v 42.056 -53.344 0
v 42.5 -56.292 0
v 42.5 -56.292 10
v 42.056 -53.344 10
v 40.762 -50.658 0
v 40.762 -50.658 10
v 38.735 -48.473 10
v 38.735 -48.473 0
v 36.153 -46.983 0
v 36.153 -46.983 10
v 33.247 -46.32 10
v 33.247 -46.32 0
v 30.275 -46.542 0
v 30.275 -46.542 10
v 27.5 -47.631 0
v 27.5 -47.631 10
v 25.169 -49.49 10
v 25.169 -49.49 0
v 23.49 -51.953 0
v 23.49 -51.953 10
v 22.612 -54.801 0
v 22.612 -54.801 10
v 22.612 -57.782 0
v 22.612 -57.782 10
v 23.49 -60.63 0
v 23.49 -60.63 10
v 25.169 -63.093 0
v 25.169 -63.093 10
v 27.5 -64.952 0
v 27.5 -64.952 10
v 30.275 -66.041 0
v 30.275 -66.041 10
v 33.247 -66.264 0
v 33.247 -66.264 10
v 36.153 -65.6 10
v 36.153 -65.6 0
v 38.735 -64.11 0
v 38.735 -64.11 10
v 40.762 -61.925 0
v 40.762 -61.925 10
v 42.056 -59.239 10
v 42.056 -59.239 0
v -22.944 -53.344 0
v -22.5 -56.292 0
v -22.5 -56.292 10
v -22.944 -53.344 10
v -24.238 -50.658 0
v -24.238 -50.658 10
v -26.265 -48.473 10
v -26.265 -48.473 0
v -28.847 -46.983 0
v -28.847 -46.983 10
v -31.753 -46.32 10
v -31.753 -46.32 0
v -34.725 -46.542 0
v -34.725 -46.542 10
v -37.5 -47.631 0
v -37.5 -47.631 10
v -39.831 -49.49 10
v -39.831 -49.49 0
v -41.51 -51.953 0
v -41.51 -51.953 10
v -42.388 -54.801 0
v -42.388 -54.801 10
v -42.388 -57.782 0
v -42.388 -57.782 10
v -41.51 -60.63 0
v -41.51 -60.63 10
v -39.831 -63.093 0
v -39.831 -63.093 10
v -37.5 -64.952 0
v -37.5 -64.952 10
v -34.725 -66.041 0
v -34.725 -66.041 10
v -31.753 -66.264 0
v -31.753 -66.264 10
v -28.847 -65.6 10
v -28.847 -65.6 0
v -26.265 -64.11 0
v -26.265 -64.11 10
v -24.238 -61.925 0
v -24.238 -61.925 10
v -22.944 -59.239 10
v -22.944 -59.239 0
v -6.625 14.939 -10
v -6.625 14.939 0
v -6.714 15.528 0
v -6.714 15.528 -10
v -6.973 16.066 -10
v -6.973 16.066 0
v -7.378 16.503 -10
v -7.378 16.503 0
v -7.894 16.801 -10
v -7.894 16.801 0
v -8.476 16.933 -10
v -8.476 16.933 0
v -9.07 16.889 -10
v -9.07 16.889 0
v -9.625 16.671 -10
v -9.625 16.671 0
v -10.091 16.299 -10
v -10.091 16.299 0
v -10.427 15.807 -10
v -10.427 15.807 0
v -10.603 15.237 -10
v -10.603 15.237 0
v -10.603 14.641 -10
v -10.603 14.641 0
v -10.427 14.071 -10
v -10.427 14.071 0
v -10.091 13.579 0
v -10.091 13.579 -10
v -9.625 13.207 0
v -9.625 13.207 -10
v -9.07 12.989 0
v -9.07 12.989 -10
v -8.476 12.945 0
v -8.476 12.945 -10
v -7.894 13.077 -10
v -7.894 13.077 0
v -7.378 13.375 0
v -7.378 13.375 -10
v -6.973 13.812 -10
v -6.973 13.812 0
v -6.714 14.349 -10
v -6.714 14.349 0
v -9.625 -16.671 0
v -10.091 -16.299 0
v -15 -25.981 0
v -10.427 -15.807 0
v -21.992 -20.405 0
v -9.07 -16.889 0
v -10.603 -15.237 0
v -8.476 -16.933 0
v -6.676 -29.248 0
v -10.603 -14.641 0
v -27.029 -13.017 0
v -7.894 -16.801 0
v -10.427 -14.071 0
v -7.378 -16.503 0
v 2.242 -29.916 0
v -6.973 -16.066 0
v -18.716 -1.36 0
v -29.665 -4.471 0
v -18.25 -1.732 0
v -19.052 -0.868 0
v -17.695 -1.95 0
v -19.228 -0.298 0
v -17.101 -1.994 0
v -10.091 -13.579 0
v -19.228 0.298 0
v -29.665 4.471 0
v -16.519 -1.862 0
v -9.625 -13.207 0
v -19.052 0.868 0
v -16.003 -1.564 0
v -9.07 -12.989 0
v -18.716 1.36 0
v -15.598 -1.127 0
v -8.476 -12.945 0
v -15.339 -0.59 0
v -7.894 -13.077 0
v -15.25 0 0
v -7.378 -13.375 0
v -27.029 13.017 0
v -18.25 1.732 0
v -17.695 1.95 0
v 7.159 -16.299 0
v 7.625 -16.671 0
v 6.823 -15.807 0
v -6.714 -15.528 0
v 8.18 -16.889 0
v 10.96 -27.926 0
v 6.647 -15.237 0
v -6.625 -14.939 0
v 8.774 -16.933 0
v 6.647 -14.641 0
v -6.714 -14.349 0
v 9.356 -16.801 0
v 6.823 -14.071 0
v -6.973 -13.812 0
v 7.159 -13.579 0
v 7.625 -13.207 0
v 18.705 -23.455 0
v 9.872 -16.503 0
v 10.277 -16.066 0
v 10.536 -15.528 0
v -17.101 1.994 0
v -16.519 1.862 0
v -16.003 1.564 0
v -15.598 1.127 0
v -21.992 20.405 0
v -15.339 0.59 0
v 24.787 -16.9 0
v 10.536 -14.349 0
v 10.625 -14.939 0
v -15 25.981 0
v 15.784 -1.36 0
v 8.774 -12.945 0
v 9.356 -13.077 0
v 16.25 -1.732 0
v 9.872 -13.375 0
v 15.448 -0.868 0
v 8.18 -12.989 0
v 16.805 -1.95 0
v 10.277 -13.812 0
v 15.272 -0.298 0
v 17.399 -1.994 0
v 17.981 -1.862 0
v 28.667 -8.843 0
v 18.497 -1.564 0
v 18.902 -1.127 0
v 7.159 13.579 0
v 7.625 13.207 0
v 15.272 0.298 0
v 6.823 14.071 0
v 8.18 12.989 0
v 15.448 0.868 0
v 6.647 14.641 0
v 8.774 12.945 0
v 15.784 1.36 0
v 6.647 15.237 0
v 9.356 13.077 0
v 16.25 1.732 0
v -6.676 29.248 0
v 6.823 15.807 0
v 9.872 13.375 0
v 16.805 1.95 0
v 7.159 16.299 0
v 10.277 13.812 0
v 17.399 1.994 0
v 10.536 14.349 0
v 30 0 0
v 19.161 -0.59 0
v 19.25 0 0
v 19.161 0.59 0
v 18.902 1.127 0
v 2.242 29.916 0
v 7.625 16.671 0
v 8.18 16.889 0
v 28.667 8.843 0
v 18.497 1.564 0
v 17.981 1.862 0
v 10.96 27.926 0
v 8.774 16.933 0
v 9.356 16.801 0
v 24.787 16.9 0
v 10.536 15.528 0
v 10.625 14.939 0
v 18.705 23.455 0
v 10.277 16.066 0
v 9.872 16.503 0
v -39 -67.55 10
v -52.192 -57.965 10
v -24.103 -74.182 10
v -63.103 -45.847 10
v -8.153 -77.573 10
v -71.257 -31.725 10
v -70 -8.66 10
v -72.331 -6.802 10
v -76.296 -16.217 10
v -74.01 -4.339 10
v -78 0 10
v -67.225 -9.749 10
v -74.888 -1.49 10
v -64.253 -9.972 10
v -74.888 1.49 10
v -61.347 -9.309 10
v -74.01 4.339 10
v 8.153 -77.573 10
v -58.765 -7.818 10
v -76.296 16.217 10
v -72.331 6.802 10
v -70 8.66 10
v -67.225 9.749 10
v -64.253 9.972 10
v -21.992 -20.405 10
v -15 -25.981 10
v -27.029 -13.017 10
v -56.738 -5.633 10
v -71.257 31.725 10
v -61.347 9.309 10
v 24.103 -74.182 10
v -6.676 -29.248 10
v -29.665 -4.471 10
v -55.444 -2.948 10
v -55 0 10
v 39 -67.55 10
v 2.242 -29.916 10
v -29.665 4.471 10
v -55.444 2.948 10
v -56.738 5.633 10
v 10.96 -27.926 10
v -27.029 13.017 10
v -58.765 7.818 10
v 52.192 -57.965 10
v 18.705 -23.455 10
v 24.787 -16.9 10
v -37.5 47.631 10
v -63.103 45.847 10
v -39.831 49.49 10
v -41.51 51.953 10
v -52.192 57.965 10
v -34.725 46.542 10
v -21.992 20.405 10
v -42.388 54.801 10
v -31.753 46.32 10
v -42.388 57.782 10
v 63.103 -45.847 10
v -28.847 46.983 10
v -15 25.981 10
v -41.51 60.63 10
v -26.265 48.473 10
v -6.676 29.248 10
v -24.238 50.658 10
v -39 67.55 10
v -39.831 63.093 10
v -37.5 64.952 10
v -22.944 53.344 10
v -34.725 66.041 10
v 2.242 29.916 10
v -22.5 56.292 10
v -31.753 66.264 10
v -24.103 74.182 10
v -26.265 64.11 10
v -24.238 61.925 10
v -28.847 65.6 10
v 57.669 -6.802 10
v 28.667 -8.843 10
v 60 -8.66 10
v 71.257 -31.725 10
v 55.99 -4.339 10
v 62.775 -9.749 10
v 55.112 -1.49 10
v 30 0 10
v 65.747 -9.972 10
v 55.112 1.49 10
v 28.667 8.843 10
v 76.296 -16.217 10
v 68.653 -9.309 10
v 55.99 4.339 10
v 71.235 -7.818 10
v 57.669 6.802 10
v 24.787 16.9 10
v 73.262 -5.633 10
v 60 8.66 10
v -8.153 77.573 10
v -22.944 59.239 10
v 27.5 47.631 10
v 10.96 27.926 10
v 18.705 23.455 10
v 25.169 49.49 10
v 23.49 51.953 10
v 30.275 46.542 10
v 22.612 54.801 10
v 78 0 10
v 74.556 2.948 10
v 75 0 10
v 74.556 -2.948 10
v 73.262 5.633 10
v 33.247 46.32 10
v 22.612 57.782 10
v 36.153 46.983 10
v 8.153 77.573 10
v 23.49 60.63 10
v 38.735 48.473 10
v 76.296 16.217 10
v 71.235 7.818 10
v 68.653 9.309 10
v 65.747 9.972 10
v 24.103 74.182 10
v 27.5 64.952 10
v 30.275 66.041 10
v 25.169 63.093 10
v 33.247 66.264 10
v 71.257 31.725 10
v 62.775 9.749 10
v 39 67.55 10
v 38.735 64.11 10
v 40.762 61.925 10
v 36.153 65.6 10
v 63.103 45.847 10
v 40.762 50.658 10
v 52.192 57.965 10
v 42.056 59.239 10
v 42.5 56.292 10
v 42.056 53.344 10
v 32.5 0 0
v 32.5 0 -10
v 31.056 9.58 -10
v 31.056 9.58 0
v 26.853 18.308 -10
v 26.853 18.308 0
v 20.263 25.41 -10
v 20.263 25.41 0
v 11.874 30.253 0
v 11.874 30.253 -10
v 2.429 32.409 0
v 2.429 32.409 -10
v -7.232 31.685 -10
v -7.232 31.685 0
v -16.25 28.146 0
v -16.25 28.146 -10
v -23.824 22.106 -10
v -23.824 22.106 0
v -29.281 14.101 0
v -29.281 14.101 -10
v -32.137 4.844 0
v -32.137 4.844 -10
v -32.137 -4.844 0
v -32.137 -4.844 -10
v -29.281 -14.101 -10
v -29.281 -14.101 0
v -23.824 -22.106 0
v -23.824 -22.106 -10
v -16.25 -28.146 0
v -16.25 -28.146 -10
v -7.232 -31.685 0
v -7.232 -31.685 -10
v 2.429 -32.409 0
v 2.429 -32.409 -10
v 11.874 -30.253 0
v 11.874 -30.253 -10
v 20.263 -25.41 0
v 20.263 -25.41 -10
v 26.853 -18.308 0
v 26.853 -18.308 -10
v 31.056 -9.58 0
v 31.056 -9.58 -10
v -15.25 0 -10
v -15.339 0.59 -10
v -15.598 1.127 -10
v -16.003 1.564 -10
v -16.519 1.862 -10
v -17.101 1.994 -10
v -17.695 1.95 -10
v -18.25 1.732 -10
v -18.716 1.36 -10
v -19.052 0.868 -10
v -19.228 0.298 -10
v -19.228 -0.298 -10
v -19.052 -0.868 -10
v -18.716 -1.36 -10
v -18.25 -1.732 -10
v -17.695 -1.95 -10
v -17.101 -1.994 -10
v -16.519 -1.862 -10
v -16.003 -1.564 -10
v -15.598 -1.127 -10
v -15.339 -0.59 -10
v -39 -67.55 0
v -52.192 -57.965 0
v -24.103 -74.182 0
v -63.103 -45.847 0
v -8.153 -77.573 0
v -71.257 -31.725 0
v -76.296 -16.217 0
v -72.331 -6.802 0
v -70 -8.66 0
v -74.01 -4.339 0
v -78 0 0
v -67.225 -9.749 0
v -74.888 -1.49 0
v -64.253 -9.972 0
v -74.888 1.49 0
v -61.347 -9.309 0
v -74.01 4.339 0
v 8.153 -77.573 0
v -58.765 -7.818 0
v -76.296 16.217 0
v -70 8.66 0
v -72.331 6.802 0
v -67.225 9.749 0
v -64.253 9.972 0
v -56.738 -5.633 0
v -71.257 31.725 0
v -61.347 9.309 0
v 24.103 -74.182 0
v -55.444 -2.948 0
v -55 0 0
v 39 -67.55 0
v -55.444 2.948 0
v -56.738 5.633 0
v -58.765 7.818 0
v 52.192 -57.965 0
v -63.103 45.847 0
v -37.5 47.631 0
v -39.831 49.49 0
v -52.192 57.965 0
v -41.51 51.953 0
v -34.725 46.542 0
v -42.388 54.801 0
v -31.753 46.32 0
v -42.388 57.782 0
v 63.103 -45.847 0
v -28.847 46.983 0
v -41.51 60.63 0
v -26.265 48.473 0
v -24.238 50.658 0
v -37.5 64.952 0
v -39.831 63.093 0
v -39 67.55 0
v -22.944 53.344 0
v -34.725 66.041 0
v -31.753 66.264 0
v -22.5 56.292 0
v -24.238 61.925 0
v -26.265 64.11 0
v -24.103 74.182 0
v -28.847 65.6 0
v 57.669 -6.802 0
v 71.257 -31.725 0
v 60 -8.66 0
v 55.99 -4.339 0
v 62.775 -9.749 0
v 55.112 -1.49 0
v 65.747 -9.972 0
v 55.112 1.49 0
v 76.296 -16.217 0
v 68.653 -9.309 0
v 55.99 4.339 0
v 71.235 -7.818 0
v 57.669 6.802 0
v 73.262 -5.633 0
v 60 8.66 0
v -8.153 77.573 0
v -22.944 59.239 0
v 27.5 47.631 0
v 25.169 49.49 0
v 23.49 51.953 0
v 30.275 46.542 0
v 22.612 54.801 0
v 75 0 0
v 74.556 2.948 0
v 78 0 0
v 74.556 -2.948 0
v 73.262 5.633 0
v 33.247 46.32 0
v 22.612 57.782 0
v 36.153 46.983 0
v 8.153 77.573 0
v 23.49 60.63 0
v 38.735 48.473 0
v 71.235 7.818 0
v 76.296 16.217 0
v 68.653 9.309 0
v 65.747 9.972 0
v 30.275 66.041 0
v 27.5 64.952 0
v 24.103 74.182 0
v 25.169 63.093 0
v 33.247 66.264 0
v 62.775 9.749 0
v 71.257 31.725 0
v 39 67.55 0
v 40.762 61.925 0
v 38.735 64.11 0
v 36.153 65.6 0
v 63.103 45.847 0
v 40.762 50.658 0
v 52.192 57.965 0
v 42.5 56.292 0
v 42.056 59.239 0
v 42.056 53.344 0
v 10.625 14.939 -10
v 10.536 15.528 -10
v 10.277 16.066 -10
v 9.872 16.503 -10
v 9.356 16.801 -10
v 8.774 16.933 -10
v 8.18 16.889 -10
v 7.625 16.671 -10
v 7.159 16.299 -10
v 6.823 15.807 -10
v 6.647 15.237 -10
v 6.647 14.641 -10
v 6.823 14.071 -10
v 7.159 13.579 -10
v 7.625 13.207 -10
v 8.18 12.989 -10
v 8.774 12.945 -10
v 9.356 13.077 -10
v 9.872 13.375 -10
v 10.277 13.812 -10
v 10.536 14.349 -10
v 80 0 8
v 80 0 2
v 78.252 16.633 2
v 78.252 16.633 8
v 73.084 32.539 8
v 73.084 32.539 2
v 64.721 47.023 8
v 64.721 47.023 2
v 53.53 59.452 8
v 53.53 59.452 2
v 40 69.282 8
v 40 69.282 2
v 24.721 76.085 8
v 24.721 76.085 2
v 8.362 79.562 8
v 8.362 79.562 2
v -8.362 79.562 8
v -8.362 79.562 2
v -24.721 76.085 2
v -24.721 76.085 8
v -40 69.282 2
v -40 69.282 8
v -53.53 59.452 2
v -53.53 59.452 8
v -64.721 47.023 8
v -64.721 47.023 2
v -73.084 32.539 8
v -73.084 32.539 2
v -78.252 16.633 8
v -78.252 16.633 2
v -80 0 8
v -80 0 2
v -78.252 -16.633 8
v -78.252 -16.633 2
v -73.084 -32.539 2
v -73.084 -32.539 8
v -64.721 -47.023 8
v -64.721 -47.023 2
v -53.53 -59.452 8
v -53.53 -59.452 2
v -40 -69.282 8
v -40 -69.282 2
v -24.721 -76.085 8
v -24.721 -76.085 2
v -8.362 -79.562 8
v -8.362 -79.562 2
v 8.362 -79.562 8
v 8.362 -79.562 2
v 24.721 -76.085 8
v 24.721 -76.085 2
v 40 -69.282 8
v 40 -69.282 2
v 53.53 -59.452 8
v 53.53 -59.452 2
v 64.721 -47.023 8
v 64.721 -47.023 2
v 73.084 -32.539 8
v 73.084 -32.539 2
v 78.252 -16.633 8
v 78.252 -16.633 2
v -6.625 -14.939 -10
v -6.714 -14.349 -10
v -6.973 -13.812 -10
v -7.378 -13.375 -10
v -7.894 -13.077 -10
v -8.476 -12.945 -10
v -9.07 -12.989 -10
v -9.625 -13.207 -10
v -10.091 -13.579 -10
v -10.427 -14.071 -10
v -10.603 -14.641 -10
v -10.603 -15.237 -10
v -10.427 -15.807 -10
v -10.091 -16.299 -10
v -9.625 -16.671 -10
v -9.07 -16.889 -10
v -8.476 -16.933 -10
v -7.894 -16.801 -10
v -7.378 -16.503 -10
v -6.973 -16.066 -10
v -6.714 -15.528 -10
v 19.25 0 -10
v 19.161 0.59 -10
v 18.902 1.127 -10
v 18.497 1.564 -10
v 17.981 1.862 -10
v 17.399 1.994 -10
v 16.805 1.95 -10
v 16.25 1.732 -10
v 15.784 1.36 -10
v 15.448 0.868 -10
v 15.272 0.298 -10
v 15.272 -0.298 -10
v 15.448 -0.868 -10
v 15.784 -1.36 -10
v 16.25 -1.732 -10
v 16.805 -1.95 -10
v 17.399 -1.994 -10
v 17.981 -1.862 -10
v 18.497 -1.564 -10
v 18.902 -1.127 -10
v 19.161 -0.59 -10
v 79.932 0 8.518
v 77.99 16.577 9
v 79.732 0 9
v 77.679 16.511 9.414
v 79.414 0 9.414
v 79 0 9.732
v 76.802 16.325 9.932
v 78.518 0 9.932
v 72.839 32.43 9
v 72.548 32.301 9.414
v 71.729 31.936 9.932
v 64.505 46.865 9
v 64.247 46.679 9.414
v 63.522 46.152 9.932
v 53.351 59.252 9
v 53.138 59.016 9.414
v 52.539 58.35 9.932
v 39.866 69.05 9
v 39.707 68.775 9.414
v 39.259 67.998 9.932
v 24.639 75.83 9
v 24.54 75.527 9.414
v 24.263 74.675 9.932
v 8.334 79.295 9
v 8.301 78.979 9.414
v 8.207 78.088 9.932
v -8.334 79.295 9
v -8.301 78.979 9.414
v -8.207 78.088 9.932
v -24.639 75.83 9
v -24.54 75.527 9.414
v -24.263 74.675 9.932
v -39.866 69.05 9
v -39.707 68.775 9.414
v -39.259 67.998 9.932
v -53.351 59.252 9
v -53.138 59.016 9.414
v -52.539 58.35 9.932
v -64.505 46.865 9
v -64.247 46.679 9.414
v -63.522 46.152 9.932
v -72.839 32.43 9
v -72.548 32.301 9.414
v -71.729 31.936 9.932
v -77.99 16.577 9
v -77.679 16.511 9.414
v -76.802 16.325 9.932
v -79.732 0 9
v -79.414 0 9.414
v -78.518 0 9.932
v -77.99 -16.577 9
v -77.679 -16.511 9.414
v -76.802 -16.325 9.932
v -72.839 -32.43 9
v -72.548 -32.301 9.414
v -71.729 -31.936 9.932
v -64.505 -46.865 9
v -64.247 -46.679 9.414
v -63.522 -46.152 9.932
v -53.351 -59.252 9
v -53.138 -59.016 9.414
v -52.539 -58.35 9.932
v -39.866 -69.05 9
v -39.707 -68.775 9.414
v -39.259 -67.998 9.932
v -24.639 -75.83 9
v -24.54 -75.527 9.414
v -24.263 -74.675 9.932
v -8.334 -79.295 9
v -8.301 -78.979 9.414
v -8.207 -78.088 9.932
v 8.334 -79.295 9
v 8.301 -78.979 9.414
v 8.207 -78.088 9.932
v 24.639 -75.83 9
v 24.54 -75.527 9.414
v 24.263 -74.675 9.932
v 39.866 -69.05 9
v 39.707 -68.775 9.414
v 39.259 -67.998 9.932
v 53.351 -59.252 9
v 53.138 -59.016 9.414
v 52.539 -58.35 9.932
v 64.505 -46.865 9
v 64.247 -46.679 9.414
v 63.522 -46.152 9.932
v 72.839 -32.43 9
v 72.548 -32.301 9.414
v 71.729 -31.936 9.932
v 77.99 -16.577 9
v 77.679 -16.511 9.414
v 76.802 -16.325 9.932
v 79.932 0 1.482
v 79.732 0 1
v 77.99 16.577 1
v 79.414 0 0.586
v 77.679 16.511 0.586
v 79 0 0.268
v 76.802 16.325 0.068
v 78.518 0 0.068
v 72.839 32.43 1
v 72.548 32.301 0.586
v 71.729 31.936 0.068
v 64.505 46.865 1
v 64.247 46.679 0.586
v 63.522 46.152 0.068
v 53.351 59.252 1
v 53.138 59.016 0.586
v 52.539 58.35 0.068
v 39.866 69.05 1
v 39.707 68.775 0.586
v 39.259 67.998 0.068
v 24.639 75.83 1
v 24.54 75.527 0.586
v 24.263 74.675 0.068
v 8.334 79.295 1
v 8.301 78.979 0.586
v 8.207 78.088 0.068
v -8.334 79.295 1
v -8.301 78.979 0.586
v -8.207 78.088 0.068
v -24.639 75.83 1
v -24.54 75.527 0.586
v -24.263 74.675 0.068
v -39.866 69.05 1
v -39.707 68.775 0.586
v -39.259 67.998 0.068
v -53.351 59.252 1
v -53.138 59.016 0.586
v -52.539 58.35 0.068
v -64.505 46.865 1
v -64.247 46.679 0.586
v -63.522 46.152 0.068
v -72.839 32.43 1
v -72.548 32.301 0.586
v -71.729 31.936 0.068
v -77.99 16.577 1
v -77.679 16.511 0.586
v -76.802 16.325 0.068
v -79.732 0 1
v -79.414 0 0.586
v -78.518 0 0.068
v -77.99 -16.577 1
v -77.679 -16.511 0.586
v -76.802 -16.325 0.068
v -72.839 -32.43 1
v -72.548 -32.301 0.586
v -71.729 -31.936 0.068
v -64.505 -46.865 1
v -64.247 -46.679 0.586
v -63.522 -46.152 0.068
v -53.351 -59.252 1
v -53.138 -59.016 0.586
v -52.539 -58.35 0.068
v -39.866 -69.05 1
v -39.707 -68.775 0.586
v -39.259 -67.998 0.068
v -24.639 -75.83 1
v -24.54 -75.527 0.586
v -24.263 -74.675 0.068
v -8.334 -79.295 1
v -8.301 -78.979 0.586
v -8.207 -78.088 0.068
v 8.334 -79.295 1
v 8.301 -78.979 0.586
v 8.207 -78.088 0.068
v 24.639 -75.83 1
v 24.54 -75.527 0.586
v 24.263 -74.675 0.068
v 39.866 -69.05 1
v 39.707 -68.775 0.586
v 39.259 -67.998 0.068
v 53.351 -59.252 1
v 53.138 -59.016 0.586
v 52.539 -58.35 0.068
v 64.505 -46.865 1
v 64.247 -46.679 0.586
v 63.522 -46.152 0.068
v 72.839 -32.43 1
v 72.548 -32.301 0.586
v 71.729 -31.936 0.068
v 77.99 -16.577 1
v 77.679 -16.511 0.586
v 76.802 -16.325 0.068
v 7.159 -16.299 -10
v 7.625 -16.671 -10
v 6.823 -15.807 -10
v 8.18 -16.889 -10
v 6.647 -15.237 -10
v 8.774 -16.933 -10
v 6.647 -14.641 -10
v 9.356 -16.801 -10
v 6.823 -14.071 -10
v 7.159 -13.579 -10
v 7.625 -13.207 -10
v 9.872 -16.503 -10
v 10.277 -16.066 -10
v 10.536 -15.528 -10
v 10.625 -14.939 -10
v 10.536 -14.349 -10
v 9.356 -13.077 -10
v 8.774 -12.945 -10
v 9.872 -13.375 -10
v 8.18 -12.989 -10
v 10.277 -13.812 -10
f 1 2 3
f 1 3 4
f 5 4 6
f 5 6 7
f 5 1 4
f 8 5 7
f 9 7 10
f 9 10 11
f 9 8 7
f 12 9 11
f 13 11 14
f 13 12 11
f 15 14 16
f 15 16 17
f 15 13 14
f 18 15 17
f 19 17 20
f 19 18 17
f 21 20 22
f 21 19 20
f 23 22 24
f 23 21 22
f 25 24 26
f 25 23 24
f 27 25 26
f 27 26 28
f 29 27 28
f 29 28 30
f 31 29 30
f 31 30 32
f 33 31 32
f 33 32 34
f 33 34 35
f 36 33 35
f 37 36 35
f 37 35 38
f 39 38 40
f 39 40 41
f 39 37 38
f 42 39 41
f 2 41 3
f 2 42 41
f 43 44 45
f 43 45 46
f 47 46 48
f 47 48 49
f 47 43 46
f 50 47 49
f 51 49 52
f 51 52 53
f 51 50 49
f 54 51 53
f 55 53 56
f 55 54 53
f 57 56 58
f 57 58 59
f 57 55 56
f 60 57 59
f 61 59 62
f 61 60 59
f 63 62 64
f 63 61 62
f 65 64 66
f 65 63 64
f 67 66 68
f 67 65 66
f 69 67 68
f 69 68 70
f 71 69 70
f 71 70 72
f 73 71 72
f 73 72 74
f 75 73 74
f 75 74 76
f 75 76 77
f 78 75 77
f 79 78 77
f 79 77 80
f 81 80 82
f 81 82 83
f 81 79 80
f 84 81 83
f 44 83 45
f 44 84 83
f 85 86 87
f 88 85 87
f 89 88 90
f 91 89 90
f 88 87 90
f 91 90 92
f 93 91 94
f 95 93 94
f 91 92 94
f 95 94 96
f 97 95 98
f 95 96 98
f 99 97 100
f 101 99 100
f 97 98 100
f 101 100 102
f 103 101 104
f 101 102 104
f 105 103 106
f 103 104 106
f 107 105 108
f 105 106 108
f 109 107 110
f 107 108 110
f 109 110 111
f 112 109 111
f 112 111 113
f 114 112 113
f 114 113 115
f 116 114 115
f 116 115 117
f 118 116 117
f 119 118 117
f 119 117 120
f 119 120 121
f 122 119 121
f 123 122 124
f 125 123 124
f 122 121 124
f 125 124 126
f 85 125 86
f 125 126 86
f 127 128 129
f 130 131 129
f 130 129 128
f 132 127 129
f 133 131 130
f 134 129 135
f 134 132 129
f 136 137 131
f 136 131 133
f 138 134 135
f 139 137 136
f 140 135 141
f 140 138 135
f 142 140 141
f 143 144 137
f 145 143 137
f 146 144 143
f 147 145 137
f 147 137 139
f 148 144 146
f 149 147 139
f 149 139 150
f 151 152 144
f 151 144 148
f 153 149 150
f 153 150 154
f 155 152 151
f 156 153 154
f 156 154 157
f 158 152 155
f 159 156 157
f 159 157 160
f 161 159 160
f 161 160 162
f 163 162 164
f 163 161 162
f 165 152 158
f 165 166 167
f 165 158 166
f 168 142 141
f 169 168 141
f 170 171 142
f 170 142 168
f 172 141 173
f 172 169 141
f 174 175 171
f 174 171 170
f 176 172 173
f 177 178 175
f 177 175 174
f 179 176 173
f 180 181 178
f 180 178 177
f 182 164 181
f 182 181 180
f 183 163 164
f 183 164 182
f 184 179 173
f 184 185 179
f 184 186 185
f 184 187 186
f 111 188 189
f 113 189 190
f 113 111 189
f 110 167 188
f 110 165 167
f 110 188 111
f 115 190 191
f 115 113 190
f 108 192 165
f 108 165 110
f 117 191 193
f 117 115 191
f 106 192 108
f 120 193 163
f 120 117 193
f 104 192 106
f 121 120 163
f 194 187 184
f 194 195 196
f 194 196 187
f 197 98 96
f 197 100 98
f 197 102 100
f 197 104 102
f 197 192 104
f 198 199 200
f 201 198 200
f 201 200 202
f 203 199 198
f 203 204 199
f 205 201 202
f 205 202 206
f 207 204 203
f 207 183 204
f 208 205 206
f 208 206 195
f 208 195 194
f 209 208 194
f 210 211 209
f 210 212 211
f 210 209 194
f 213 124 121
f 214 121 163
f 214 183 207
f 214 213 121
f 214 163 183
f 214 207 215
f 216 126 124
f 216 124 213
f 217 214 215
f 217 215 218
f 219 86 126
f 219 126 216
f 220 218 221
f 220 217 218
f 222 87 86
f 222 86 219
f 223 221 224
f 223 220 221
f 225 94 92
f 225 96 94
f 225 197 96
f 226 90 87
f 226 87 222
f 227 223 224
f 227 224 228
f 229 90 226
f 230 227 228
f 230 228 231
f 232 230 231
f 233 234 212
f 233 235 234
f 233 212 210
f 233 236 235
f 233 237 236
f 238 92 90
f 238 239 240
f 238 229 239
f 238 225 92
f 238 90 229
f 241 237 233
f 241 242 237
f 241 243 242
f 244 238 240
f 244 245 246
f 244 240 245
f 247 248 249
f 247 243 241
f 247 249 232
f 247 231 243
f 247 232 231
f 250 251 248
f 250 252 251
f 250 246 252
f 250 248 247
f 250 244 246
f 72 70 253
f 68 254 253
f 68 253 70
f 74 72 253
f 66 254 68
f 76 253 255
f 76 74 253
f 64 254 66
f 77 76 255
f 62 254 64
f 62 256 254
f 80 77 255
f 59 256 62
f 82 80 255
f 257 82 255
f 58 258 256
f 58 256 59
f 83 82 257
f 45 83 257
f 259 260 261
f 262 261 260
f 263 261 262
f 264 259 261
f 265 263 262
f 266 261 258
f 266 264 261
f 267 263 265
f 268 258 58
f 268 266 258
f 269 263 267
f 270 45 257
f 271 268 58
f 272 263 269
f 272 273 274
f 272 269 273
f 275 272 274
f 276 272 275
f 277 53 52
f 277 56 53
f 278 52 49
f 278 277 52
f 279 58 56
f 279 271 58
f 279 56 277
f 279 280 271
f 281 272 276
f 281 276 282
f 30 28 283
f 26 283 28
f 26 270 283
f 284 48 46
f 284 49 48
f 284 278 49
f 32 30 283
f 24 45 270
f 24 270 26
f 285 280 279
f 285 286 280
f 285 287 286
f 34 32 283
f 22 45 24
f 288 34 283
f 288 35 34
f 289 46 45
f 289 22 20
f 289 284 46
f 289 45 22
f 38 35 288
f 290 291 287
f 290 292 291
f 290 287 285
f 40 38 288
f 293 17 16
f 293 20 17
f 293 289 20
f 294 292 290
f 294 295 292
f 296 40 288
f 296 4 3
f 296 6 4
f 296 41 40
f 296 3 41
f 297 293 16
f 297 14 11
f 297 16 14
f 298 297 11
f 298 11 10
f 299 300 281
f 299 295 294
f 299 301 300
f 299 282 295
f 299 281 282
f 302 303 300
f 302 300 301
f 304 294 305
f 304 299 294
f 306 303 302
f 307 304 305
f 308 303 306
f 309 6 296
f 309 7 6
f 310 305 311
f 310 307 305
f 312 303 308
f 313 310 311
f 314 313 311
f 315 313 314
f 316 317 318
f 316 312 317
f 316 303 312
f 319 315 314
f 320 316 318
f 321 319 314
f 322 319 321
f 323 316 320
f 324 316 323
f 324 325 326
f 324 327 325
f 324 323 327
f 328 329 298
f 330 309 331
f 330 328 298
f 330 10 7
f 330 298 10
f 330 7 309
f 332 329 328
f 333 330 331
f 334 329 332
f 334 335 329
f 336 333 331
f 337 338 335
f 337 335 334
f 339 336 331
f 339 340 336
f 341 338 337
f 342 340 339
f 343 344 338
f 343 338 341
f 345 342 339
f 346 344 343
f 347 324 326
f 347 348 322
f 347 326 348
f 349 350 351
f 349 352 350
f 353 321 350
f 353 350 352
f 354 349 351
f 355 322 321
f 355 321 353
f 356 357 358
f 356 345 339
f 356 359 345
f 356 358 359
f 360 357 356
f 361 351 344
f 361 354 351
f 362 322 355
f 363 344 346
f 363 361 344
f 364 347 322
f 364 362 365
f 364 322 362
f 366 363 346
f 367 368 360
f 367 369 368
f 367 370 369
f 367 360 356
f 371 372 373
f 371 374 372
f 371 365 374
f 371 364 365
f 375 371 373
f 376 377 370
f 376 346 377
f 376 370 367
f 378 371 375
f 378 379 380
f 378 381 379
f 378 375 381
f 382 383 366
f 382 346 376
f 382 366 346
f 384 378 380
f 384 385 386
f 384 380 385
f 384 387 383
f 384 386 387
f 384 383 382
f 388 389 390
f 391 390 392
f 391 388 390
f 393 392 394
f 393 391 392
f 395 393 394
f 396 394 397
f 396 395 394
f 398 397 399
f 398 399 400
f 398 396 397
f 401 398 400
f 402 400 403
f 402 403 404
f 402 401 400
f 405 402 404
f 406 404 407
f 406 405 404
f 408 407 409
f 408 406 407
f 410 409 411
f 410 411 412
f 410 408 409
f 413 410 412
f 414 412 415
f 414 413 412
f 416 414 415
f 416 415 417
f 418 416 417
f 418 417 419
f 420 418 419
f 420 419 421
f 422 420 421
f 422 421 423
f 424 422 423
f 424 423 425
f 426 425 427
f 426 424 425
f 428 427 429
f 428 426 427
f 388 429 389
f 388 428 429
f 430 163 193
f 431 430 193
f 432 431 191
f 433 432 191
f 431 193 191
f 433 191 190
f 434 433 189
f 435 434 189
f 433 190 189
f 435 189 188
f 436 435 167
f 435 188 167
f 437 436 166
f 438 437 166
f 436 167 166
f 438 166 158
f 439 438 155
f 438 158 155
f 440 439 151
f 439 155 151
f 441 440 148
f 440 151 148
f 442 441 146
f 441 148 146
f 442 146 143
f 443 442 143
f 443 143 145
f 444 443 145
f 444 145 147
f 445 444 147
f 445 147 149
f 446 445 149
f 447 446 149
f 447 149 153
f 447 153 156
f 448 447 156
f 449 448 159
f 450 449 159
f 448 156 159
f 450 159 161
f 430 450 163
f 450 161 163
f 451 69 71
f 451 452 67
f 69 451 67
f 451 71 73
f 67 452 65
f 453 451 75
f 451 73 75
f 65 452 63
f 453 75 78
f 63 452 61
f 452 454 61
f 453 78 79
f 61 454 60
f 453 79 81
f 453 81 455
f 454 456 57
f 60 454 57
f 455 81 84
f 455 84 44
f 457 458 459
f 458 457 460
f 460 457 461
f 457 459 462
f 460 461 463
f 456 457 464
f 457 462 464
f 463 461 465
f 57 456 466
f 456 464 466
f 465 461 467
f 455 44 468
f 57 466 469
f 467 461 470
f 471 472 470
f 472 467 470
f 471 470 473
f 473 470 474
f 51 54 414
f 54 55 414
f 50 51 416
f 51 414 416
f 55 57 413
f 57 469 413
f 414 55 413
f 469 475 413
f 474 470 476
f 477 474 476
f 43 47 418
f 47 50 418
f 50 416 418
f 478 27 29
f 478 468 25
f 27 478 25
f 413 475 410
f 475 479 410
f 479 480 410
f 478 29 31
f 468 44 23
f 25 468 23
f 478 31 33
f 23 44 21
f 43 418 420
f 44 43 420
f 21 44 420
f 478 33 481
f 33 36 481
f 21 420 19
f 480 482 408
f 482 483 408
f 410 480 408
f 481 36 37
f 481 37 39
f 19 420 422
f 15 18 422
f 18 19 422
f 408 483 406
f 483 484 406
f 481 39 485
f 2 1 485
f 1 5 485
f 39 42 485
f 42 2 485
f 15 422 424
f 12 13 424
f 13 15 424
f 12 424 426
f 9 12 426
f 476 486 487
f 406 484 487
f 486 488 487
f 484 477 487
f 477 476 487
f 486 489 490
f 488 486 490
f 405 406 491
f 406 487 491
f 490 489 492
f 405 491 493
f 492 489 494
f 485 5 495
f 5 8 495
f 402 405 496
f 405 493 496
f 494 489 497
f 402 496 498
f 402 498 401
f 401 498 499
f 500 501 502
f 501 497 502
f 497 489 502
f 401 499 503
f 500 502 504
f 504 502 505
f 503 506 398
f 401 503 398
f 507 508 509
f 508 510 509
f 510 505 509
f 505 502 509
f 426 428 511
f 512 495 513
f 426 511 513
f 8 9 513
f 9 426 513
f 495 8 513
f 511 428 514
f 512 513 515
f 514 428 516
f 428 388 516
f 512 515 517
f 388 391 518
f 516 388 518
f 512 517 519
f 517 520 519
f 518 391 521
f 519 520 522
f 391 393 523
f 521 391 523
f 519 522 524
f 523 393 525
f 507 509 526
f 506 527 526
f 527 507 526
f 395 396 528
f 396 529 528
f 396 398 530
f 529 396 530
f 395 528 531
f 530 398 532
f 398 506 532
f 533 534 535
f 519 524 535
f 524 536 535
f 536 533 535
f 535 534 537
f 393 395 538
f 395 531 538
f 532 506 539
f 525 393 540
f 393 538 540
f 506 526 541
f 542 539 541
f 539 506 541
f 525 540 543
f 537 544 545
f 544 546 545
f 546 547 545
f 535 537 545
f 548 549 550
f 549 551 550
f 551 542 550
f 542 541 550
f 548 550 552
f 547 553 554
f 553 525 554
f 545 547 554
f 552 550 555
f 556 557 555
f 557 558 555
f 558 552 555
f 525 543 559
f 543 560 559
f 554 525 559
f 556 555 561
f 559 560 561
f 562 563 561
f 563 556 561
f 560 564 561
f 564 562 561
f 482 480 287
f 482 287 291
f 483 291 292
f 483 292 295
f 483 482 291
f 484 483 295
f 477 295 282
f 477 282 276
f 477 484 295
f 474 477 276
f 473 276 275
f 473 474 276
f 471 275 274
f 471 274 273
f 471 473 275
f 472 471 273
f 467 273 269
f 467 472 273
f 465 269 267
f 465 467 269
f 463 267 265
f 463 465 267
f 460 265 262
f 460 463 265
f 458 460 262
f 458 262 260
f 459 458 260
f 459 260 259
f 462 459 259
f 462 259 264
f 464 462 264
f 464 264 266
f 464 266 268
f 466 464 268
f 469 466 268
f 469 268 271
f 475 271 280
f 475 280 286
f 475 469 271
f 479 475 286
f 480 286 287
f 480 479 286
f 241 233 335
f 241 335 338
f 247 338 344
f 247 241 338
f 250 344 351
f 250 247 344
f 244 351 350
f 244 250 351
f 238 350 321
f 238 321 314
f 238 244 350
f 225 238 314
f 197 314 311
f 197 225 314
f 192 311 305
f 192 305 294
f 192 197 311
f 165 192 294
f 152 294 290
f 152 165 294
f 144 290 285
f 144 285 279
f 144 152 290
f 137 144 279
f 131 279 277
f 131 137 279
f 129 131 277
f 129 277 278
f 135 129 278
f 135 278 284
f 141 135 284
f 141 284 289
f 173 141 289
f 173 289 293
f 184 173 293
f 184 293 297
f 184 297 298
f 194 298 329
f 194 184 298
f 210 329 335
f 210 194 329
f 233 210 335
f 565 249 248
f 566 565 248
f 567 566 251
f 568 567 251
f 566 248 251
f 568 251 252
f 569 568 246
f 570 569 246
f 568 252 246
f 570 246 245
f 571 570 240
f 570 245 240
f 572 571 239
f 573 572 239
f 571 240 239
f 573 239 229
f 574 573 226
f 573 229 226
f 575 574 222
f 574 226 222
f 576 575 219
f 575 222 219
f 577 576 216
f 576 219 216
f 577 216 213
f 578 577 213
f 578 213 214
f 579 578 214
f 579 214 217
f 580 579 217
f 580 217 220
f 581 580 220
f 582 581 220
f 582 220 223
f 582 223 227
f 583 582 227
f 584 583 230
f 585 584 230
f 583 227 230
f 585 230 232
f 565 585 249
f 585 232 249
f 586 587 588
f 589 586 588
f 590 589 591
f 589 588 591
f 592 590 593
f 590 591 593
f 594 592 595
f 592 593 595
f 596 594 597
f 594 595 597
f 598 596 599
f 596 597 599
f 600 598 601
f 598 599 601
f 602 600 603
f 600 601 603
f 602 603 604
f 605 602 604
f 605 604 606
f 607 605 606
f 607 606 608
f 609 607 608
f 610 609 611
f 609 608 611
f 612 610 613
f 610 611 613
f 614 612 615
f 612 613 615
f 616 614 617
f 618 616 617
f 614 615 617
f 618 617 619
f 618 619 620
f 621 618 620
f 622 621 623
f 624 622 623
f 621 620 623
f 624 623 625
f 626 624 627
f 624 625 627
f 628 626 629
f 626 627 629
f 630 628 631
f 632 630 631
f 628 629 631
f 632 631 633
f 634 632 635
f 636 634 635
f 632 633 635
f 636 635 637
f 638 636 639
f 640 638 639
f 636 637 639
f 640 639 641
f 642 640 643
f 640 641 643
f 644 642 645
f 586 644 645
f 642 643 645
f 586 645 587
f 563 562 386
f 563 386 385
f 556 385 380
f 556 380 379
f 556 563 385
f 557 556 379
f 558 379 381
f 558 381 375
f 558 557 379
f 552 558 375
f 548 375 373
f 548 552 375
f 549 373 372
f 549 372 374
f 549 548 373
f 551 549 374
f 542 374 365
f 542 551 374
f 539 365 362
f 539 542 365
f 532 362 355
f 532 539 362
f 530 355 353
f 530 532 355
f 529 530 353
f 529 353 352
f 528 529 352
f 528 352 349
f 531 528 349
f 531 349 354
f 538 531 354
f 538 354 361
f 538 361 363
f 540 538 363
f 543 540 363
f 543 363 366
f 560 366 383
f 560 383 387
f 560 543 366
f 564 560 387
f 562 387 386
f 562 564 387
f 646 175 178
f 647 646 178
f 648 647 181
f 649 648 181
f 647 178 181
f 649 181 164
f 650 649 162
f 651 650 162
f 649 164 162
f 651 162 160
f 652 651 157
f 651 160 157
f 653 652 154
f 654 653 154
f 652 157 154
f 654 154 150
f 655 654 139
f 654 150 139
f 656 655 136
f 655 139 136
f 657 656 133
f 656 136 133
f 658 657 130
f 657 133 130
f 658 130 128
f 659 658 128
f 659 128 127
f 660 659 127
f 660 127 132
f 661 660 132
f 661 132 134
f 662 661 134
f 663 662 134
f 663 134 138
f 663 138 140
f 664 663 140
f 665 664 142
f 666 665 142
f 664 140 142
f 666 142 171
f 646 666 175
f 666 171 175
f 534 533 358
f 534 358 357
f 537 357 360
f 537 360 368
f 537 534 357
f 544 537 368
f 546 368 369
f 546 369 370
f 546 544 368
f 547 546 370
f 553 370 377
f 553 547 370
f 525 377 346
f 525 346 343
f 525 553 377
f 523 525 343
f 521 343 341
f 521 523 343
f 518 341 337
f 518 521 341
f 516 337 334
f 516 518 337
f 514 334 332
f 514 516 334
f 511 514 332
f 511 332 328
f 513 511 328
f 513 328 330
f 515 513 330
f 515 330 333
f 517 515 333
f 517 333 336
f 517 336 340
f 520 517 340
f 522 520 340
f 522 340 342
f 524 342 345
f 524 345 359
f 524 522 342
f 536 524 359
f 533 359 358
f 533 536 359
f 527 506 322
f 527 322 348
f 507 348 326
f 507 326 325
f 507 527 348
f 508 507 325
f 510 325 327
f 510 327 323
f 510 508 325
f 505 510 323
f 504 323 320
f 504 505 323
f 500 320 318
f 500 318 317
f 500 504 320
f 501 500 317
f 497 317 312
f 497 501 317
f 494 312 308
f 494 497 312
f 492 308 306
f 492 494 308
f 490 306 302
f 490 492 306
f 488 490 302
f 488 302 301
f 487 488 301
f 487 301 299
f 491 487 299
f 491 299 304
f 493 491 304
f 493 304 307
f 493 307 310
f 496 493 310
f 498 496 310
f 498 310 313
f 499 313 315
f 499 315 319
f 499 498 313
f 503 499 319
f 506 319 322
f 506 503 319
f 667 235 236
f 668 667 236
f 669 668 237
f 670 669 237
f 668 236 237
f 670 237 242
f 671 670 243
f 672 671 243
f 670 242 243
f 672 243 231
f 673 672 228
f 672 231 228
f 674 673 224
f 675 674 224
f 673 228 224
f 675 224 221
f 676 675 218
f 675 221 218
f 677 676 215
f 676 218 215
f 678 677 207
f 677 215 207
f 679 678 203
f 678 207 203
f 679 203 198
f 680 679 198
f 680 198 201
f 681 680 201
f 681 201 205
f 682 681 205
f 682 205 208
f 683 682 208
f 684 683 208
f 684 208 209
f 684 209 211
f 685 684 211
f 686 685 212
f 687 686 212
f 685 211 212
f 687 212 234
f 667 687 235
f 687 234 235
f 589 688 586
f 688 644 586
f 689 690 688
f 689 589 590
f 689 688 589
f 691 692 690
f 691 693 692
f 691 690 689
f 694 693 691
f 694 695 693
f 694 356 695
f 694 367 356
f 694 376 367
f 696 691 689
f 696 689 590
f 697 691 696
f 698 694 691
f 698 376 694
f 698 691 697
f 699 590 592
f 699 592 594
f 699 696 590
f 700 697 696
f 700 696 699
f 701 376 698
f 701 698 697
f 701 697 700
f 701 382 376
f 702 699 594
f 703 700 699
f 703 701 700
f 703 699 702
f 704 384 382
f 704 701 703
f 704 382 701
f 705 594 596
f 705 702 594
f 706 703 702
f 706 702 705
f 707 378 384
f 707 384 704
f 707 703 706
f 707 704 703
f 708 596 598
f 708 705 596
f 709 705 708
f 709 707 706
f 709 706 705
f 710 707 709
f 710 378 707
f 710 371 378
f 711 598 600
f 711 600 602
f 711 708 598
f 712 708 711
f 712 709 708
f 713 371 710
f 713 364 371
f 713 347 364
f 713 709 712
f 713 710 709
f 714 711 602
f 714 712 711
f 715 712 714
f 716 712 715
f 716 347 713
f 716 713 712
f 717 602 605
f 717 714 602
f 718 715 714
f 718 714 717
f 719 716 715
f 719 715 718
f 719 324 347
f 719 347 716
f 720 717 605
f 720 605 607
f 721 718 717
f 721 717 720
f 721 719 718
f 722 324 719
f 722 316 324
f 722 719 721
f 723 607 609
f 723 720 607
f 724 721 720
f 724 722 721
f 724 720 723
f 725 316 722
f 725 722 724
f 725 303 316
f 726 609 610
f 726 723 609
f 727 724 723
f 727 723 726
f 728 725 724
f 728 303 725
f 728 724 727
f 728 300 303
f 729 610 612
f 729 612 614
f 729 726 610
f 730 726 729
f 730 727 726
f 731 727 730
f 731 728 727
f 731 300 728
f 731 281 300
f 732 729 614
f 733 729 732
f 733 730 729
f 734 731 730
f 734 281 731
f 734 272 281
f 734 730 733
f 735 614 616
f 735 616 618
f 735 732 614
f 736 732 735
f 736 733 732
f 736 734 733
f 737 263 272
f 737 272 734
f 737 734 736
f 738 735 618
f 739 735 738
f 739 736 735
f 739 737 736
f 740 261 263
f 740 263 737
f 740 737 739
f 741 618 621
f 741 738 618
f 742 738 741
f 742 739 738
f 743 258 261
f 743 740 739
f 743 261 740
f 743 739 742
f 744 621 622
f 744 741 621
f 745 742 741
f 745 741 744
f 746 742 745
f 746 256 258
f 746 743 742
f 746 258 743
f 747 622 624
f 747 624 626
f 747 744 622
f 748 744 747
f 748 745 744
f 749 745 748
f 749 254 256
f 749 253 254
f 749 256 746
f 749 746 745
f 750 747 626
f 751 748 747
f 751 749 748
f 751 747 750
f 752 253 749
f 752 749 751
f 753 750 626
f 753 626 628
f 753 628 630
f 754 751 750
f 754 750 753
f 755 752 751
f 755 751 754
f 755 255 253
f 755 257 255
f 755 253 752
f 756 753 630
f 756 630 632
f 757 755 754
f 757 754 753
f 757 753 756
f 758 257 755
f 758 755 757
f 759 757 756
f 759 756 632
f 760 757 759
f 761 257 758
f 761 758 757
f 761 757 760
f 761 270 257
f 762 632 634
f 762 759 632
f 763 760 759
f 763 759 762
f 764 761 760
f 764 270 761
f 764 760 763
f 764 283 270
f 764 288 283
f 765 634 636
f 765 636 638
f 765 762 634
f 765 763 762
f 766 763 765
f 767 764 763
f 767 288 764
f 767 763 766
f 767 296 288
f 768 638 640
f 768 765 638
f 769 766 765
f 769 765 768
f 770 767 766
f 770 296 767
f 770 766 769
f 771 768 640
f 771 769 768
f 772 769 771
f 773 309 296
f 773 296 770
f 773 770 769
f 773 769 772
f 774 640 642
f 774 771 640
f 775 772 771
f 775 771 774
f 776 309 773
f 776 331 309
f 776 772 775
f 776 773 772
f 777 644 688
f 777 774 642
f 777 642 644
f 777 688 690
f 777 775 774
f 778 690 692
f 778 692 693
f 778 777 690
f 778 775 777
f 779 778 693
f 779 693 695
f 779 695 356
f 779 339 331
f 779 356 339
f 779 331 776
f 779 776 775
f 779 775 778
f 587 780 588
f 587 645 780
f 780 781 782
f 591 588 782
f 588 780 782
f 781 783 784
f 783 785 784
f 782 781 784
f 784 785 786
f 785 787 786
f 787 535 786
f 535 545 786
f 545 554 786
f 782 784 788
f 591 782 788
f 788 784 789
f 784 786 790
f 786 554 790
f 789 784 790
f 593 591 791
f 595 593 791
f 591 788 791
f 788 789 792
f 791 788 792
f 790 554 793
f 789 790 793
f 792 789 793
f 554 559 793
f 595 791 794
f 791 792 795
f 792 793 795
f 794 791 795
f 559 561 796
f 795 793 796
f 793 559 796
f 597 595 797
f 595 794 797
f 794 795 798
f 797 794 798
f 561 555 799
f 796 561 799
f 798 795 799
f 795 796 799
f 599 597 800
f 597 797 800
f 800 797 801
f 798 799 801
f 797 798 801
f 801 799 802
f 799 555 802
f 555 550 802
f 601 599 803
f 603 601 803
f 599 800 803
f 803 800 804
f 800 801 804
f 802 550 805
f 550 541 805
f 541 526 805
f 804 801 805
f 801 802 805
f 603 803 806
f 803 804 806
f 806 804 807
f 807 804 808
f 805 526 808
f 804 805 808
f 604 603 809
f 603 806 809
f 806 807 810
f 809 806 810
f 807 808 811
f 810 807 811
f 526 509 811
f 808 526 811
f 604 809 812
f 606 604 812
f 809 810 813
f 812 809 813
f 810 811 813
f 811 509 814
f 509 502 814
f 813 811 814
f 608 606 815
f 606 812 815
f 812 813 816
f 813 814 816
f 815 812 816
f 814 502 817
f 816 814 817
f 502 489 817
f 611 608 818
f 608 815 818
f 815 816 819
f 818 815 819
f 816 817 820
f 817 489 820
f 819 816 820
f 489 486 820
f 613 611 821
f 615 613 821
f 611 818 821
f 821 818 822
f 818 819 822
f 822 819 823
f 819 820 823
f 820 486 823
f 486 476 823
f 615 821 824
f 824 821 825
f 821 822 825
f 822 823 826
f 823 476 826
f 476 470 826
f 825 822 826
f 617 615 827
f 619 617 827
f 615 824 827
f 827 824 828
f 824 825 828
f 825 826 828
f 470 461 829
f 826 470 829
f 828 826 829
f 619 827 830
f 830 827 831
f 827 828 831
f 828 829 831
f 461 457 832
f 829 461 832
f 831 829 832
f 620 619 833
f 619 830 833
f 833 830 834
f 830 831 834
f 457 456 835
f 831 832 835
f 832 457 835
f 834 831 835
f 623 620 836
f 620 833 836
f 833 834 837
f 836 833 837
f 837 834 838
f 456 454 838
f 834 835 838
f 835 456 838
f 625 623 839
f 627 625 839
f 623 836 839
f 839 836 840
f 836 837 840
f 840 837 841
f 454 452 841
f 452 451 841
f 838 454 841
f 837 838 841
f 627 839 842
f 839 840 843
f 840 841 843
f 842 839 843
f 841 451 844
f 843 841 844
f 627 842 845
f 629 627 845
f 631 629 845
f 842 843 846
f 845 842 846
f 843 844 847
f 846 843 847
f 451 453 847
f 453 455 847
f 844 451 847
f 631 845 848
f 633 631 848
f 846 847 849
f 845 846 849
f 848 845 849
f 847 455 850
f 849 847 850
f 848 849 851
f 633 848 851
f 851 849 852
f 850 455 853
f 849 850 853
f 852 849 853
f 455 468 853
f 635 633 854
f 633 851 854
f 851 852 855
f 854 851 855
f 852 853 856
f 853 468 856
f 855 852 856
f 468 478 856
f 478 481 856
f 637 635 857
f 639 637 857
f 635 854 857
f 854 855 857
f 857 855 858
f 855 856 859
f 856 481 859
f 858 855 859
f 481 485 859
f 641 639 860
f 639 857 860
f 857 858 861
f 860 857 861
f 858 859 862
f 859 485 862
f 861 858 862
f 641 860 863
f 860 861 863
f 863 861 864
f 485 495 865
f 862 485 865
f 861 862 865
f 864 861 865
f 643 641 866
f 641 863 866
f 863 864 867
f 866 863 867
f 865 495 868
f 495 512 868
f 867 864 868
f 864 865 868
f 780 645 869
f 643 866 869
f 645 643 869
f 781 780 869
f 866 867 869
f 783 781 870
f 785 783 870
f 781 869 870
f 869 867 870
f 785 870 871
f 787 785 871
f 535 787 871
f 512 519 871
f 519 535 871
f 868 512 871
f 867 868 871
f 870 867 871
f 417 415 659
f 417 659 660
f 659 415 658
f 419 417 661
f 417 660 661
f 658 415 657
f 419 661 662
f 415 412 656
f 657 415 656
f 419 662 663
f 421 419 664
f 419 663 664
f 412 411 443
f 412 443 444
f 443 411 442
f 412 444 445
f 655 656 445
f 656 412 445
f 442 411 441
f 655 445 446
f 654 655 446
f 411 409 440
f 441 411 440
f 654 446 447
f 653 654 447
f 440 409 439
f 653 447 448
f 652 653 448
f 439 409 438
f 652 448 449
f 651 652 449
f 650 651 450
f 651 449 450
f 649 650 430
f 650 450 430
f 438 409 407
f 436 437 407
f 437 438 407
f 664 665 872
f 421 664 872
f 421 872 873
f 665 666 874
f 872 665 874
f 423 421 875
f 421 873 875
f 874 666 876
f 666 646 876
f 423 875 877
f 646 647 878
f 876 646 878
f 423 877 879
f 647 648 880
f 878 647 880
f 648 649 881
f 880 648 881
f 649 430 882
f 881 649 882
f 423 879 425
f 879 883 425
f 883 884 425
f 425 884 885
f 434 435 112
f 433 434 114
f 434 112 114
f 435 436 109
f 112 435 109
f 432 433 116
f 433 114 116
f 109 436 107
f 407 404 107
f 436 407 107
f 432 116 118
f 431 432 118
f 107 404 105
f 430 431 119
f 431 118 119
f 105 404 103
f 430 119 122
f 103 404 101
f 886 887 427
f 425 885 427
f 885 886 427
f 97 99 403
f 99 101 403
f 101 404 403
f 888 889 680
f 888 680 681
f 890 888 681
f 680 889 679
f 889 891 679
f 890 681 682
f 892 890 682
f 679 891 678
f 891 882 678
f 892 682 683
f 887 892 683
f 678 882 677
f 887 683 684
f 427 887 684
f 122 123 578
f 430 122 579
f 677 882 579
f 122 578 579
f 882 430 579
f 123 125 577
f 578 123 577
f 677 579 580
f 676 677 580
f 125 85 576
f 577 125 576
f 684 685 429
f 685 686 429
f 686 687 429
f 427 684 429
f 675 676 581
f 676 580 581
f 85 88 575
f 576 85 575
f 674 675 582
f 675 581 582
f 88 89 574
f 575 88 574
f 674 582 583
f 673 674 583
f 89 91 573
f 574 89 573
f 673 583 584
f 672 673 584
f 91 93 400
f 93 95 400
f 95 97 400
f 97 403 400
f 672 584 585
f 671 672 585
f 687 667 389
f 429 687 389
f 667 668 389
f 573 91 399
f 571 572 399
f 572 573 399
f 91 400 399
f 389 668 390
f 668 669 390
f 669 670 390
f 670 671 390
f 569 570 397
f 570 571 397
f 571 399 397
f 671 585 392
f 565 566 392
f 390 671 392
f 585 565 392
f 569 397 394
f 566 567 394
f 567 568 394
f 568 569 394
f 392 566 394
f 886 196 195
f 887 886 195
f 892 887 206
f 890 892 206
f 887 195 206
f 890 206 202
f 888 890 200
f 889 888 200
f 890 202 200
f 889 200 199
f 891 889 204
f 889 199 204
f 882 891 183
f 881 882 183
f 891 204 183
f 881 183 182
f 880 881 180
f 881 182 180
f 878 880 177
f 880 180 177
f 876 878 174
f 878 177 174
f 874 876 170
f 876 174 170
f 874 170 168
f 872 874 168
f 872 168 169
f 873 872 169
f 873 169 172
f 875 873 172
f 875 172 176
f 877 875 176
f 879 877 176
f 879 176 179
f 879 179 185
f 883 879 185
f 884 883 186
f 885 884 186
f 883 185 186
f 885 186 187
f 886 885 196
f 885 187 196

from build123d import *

# Parameters (mm, degrees)
SKETCH_2_R          = 80
EXTRUDE_1_DEPTH     = 10
SKETCH_3_R          = 32.5
EXTRUDE_2_DEPTH     = 10
SKETCH_4_R          = 2
CUT_EXTRUDE_1_DEPTH = 10
SKETCH_5_R          = 30
CUT_EXTRUDE_2_DEPTH = 10
SKETCH_6_R          = 10
CUT_EXTRUDE_3_DEPTH = 10
FILLET_1_R          = 2


with BuildPart() as part:
    # 草图2 → 凸台-拉伸1 (new body)
    with BuildSketch(Plane.XY):
        Circle(SKETCH_2_R)
    extrude(amount=EXTRUDE_1_DEPTH)

    # 草图3 → 凸台-拉伸2 (add)
    with BuildSketch(Plane.XY):
        Circle(SKETCH_3_R)
    extrude(amount=-EXTRUDE_2_DEPTH)

    # 草图4 → 切除-拉伸1 (cut)
    with BuildSketch(Plane.XY):
        with Locations((-17.25, 0)):
            Circle(SKETCH_4_R)
        with Locations((-8.625, 14.938938215)):
            Circle(SKETCH_4_R)
        with Locations((8.625, 14.938938215)):
            Circle(SKETCH_4_R)
        with Locations((17.25, 0)):
            Circle(SKETCH_4_R)
        with Locations((8.625, -14.938938215)):
            Circle(SKETCH_4_R)
        with Locations((-8.625, -14.938938215)):
            Circle(SKETCH_4_R)
    extrude(amount=-CUT_EXTRUDE_1_DEPTH, mode=Mode.SUBTRACT)

    # 草图5 → 切除-拉伸2 (cut)
    with BuildSketch(Plane.XY):
        Circle(SKETCH_5_R)
    extrude(amount=CUT_EXTRUDE_2_DEPTH, mode=Mode.SUBTRACT)

    # 草图6 → 切除-拉伸3 (cut)
    with BuildSketch(Plane.XY):
        with Locations((-65, 0)):
            Circle(SKETCH_6_R)
        with Locations((-32.5, 56.291651246)):
            Circle(SKETCH_6_R)
        with Locations((32.5, 56.291651246)):
            Circle(SKETCH_6_R)
        with Locations((65, 0)):
            Circle(SKETCH_6_R)
        with Locations((32.5, -56.291651246)):
            Circle(SKETCH_6_R)
        with Locations((-32.5, -56.291651246)):
            Circle(SKETCH_6_R)
    extrude(amount=CUT_EXTRUDE_3_DEPTH, mode=Mode.SUBTRACT)

    # 圆角1
    fillet_1_edges = [part.edges().sort_by_distance(p)[0] for p in [
        (-80, 0, 0),
        (-80, 0, 10),
    ]]
    fillet(fillet_1_edges, radius=FILLET_1_R)


solid = part.part
